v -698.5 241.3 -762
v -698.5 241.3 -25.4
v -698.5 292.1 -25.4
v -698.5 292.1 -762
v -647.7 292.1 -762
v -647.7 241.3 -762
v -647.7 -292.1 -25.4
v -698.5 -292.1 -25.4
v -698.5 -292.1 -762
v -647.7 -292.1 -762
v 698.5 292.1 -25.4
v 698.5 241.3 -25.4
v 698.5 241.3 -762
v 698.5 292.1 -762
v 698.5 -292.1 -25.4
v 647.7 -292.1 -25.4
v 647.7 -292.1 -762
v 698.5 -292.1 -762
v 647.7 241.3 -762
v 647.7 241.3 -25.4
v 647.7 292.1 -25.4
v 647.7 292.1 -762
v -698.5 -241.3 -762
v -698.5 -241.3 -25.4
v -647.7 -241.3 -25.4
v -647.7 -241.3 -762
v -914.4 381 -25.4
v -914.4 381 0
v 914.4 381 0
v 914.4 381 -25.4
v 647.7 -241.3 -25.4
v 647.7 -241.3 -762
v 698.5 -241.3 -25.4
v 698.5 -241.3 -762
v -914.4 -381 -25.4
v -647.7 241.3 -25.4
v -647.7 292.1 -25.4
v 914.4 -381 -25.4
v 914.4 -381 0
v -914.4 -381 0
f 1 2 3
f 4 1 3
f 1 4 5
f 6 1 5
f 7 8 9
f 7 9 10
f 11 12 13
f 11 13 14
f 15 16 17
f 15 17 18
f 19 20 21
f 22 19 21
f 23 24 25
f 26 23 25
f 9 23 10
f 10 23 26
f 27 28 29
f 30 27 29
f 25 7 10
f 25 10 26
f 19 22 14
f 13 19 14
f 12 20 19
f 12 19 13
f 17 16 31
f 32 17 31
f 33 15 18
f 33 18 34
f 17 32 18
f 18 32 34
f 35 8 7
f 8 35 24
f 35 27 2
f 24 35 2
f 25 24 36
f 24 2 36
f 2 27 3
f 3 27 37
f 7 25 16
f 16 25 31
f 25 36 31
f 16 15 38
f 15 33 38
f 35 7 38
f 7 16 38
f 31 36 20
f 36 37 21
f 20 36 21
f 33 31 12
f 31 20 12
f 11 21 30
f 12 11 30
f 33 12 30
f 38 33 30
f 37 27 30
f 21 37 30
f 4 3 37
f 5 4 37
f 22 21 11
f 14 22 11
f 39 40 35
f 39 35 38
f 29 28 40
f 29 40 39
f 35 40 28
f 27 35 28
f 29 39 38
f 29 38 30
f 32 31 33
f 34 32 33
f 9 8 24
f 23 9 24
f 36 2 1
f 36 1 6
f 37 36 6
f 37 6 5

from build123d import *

# Parameters (mm, degrees)
F0_W     = 1828.8
F0_H     = 762
F1_DEPTH = 25.4
F2_W     = 50.8
F2_H     = 50.8
F3_DEPTH = 762


with BuildPart() as f1:
    # F0 (on Top) → F1 (new body)
    with BuildSketch(Plane.XY):
        Rectangle(F0_W, F0_H)
    extrude(amount=-F1_DEPTH)

    # F2 (on Top) → F3 (join)
    with BuildSketch(Plane.XY):
        with Locations((673.1, 266.7)):
            Rectangle(F2_W, F2_H)
        with Locations((673.1, -266.7)):
            Rectangle(F2_W, F2_H)
        with Locations((-673.1, -266.7)):
            Rectangle(F2_W, F2_H)
        with Locations((-673.1, 266.7)):
            Rectangle(F2_W, F2_H)
    extrude(amount=-F3_DEPTH)


solid = f1.part
